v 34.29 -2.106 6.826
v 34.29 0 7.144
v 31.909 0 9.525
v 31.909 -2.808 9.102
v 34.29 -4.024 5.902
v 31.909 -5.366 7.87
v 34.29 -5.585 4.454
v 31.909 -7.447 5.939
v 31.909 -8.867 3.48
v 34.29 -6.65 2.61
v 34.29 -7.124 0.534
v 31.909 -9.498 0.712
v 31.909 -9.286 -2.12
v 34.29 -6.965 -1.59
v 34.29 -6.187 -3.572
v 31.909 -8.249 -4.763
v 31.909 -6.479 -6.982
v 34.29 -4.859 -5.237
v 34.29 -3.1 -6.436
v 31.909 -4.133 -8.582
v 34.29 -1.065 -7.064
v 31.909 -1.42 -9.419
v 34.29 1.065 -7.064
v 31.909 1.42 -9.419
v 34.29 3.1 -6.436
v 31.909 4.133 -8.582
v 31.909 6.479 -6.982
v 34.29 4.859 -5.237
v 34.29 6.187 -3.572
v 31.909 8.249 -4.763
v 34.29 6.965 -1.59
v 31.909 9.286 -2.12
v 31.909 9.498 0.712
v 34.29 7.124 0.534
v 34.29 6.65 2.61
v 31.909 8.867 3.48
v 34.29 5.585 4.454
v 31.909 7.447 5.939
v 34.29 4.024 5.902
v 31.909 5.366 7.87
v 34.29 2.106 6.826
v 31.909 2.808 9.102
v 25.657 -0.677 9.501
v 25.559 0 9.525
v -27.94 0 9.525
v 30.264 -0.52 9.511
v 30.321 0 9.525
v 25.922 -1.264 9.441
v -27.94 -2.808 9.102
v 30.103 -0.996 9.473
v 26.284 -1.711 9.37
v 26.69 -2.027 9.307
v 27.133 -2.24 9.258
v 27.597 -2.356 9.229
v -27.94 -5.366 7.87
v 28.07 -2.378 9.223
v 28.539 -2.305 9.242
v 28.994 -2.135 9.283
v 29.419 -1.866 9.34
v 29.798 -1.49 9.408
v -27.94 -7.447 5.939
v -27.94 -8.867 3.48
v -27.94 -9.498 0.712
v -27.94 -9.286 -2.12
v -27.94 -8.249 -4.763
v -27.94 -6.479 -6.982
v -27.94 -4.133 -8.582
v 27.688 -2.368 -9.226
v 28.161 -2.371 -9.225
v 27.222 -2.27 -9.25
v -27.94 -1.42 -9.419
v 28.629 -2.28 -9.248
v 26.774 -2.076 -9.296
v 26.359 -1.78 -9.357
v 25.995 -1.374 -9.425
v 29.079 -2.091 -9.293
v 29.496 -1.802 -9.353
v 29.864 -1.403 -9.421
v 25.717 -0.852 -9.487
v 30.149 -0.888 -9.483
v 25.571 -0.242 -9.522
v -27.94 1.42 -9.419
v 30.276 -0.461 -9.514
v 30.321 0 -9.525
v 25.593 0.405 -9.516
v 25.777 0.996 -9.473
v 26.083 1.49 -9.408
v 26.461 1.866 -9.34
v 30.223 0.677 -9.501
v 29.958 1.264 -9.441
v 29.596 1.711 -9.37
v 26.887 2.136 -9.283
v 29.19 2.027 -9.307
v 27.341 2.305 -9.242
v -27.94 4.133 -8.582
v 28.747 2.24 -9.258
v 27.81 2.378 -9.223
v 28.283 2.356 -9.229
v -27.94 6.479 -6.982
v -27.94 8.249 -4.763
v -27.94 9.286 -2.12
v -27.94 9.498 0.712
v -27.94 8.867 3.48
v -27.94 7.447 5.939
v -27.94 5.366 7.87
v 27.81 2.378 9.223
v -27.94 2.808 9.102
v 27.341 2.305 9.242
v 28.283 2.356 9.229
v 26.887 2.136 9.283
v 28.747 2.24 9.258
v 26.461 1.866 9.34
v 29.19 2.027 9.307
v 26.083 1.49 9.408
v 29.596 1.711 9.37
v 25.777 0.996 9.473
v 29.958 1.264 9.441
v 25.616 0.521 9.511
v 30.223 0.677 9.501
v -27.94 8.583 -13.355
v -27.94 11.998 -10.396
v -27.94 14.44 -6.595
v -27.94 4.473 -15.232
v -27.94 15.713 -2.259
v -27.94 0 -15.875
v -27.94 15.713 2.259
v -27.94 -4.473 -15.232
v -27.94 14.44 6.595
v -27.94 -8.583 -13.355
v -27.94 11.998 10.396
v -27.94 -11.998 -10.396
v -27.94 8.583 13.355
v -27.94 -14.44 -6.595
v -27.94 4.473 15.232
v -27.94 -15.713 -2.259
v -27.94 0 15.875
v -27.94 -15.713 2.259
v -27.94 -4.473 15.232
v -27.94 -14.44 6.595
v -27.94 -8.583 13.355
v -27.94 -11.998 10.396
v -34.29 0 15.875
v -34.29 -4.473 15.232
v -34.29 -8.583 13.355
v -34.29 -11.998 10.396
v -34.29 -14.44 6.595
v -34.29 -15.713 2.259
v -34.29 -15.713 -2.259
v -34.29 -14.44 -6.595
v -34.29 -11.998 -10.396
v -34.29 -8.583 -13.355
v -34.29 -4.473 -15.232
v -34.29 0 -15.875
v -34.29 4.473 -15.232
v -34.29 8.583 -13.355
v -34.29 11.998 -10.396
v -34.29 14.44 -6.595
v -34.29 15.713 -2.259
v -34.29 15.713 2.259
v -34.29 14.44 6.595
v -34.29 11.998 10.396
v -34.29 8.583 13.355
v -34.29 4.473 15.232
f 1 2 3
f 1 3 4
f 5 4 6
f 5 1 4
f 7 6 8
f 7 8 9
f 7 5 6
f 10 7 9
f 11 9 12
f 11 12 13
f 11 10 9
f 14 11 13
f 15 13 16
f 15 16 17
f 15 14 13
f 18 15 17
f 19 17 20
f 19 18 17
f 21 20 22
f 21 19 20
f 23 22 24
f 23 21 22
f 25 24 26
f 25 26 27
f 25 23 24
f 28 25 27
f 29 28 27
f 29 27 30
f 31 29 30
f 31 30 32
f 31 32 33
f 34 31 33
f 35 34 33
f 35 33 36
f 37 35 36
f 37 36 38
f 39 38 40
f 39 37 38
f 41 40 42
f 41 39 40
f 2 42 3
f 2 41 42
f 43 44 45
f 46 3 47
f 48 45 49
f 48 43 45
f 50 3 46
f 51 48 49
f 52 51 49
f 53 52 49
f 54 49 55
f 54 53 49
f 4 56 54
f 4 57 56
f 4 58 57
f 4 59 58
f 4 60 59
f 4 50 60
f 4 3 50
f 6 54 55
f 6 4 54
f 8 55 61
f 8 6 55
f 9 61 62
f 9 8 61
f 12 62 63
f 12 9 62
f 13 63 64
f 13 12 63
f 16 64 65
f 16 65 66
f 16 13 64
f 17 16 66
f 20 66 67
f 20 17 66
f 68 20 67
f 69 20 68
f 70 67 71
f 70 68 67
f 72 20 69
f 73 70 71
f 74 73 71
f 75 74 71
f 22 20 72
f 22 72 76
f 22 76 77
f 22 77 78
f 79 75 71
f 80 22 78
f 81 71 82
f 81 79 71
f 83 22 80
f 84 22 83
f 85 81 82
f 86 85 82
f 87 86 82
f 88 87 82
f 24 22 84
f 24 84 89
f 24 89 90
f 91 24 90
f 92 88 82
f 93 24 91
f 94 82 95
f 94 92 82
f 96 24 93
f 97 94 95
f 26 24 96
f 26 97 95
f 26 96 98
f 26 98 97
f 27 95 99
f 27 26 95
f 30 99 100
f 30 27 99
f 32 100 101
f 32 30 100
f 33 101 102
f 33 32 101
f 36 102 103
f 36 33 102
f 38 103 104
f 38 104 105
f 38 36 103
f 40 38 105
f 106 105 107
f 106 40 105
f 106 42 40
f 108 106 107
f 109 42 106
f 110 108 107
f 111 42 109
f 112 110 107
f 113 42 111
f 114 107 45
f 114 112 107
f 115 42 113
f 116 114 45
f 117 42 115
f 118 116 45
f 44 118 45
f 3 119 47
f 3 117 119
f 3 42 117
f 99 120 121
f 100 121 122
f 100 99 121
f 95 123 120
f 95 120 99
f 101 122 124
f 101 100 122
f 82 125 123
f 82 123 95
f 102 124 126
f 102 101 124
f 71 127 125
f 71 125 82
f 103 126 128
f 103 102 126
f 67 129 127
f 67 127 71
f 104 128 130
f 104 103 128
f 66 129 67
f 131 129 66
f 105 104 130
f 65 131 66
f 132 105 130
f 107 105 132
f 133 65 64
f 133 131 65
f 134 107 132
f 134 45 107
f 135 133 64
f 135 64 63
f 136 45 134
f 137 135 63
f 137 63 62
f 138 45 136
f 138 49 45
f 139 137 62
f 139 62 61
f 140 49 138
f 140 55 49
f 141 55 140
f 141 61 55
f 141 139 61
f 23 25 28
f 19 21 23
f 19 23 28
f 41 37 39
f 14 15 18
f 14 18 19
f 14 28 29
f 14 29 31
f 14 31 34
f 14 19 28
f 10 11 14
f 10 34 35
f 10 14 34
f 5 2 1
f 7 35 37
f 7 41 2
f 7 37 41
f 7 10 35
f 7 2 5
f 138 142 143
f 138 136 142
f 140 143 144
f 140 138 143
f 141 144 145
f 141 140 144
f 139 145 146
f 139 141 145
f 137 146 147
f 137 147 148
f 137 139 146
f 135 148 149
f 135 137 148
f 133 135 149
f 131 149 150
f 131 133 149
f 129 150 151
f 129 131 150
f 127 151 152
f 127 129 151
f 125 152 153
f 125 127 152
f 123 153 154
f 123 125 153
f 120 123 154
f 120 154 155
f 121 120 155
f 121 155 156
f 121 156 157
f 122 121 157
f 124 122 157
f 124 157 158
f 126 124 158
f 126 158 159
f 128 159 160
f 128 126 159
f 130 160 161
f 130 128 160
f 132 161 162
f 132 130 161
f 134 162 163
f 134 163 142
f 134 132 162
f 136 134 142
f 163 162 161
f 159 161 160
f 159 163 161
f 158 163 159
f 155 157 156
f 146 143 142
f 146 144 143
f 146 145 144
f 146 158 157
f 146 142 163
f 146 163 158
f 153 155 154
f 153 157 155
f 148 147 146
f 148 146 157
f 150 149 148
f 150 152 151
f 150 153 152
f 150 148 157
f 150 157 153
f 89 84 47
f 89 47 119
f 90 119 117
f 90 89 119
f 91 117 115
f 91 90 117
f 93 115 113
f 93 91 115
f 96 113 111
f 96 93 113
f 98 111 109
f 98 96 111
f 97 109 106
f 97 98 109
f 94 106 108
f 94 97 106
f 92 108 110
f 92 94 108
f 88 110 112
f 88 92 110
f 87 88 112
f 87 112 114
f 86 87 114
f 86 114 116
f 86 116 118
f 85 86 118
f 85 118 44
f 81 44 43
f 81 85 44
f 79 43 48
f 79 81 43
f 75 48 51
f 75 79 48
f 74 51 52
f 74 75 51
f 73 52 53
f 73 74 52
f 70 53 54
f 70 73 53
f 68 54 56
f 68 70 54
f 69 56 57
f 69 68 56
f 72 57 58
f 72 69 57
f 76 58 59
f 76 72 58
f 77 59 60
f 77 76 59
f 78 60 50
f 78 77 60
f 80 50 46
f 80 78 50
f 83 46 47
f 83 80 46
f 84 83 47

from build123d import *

# Parameters (mm, degrees)
CUT_EXTRUDE1_DEPTH      = 41.98579449
CUT_EXTRUDE1_DEPTH_BACK = 41.98579449
SKETCH2_R               = 2.38125
CHAMFER1_SIZE           = 2.38125


with BuildPart() as part:
    # Sketch1 → Pin Body (revolve)
    with BuildSketch(Plane.XY, mode=Mode.PRIVATE) as pin_body_sk:
        Polygon((-34.29, 0), (-34.29, 15.875), (-27.94, 15.875), (-27.94, 9.525), (34.29, 9.525), (34.29, 0), align=None)
    revolve(pin_body_sk.sketch.rotate(Axis((-34.29, 0, 0), (1, 0, 0)), 90), axis=Axis((-34.29, 0, 0), (1, 0, 0)))

    # Sketch2 → Cut-Extrude1 (cut, two sides: drawn at the far end of the back side and taken through both)
    with BuildSketch(Plane.XY.offset(-CUT_EXTRUDE1_DEPTH_BACK)):
        with Locations((27.94, 0)):
            Circle(SKETCH2_R)
    extrude(amount=CUT_EXTRUDE1_DEPTH + CUT_EXTRUDE1_DEPTH_BACK, mode=Mode.SUBTRACT)

    # Chamfer1
    chamfer1_edges = [part.edges().sort_by_distance(p)[0] for p in [
        (34.29, 0, -9.525),
    ]]
    chamfer(chamfer1_edges, length=CHAMFER1_SIZE)


solid = part.part
